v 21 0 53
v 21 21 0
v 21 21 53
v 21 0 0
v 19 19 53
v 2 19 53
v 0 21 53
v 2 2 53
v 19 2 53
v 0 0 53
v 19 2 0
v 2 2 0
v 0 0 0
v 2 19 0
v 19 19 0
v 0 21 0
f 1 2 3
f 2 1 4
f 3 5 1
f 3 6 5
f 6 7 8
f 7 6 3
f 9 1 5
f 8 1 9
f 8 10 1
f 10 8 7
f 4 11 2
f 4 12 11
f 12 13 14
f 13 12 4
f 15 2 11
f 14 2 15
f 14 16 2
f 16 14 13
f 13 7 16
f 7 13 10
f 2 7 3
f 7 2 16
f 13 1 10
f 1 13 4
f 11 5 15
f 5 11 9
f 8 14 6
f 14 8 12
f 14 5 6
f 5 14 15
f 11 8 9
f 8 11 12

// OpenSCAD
diceL = 17;
diceCount = 3;
wallthickness = 2;



difference() {
//OuterCube
    cube([diceL+wallthickness*2,diceL+wallthickness*2,diceCount*diceL+wallthickness]);


//inderCut
    translate([wallthickness,wallthickness,-wallthickness])
    cube([diceL,diceL,diceCount*diceL+59]);
}
